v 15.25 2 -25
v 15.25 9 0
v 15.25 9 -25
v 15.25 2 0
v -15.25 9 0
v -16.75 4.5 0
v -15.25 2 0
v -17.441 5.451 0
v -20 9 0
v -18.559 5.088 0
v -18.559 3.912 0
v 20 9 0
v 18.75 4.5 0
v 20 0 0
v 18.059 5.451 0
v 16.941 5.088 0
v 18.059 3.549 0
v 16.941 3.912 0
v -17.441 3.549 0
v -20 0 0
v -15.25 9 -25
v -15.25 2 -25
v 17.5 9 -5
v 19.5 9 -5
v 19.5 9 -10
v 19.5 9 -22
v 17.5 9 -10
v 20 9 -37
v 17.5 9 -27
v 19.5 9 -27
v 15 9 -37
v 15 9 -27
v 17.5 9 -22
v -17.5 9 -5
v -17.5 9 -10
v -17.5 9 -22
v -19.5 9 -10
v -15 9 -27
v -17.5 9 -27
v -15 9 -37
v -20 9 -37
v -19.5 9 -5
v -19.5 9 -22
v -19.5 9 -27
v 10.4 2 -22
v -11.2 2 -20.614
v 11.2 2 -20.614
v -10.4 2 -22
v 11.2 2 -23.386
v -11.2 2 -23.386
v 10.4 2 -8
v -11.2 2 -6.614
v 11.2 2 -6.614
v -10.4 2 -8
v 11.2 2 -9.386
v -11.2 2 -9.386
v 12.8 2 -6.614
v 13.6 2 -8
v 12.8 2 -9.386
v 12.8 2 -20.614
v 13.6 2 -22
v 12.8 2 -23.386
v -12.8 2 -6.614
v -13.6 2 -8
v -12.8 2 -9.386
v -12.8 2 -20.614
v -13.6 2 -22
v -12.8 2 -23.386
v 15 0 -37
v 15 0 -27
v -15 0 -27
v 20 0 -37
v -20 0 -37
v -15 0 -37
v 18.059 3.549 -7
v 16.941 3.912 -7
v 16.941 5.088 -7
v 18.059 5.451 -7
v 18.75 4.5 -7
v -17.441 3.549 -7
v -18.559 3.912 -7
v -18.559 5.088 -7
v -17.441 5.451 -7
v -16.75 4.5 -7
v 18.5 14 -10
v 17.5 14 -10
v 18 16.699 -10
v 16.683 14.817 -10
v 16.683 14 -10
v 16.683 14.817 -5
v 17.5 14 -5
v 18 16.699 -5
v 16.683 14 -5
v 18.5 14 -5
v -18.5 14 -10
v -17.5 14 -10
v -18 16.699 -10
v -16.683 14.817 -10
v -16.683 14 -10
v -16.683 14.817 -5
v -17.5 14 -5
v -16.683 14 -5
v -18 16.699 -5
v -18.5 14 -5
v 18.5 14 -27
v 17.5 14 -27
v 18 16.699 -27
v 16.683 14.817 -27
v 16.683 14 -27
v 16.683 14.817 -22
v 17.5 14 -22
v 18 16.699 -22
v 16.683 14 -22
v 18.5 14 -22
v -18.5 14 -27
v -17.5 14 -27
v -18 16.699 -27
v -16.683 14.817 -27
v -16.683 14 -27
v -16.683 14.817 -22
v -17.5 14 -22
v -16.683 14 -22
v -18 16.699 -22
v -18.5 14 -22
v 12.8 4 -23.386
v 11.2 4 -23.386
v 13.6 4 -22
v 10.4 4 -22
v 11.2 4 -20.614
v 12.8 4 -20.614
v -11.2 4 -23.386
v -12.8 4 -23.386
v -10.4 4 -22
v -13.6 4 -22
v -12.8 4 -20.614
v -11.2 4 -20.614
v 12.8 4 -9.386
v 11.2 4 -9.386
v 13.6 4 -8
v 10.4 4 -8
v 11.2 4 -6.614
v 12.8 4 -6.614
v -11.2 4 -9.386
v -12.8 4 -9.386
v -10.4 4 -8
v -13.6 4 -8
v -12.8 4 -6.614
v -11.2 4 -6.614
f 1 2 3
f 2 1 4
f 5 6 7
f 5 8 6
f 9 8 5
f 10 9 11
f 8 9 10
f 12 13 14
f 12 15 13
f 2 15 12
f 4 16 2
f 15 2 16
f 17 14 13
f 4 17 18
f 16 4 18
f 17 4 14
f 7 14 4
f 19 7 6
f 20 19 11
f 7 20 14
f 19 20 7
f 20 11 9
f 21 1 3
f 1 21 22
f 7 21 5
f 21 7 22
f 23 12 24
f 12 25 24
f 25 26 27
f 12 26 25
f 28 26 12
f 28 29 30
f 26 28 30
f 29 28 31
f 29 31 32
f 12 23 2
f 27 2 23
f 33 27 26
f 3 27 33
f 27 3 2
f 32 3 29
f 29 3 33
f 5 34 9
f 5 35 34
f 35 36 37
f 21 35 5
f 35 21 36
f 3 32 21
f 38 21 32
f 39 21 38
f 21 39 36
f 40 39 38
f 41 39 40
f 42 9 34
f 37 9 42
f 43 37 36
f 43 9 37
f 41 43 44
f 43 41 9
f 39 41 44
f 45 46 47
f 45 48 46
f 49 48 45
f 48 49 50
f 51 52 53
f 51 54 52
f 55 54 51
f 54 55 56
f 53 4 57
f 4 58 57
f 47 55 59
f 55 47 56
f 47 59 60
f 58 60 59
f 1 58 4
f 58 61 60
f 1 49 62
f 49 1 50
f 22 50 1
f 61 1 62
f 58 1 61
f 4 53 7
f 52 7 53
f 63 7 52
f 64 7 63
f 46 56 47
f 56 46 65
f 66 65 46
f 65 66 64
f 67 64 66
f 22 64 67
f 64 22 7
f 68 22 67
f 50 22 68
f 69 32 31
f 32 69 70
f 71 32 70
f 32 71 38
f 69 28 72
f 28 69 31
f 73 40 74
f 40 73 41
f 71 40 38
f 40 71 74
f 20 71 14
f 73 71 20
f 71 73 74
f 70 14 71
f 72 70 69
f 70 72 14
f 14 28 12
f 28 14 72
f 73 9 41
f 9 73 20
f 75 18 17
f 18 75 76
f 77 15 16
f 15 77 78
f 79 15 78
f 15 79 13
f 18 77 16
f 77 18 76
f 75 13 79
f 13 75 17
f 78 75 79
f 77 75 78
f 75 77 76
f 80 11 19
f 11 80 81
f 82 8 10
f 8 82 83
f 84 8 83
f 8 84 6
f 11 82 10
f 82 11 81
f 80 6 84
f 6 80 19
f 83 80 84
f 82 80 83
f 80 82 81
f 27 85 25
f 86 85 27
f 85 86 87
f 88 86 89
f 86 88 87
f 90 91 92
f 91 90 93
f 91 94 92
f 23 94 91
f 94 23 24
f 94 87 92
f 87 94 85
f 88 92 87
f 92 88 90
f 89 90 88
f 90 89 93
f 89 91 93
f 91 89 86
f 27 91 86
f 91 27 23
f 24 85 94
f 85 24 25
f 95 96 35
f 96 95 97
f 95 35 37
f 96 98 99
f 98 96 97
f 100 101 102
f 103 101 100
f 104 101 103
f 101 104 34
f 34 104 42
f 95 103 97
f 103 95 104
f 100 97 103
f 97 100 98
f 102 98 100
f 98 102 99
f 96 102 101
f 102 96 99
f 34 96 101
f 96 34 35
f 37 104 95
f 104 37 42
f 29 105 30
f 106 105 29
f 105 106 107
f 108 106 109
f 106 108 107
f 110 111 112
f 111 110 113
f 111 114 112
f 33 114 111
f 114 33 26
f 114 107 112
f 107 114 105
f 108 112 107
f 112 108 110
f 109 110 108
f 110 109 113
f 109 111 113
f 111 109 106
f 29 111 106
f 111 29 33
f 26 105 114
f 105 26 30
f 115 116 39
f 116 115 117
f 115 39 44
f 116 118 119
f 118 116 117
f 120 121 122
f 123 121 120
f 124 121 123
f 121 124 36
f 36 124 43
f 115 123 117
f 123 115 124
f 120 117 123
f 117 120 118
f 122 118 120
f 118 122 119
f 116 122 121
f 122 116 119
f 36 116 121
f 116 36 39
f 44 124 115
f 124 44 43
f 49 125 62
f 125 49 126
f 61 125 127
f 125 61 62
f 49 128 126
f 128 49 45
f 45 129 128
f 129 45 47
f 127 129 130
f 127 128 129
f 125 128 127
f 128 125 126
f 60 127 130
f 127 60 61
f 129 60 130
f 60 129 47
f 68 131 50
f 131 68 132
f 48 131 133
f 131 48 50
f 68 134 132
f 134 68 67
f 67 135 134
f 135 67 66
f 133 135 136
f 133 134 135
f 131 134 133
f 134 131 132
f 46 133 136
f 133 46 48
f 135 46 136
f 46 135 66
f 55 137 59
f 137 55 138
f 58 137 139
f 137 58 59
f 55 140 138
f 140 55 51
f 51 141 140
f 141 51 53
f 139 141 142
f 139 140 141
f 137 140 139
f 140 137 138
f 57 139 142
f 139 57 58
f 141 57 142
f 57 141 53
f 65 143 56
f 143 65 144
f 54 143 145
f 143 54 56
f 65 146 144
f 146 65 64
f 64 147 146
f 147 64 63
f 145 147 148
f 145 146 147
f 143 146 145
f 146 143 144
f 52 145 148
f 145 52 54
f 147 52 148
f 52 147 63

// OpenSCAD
// file: HelpMethods/triangle.scad
module triangle(c, height, betha)
{ 
    c_right=height*cos(betha);
    c_left=-c+height*cos(betha);
    // draw triangle c=x, C=[0,heigth]
    polygon(points=[ [c_left,0], [c_right,0], [0,height] ]);
}

module isosides_triangle(a)
{
      height= sin(60)*a;
    // draw triangle c=x, C=[0,heigth]
      polygon(points=[ [-a/2,0], [a/2,0], [0,height] ]);
}

module isosceles_triangle(c,height)
{
    // draw triangle c=x, C=[0,heigth]
     polygon(points=[ [-c/2,0], [c/2,0], [0,height] ]);
}

module rightangular_triangle(width, height)
{
      // draw triangle c=x, C=[0,heigth]
     polygon(points=[ [0,0], [width,0], [0,height] ]);
}

rightangular_triangle(2,2);
// file: HelpMethods/SnapLib.0.36.scad
/*simple Snap library based on "Snap-Fit Joints for Plastics - A Design Guid" by Bayer MaterialScience LLC 
  http://fab.cba.mit.edu/classes/S62.12/people/vernelle.noel/Plastic_Snap_fit_design.pdf
 
 on http://www.thingiverse.com/thing:1860118
 
    by fpetrac Fausto Petraccone fpetrac@gmail.com 
    Licensed under the Creative Commons - Attribution - Non-Commercial license.
*/

/*Rev
    SnapLib 0.36.scad: added SnapHoleY function  
    SnapLib 0.35.scad: on RSnapY added a check to avioid interference of lobes during closure; on RRSnappY added a check to avioid overlapped lobes.
    SnapLib 0.30.scad  added function Hsnap and Snap to calculate the snap H or Y for cantilever snap
    SnapLib 0.25.scad  added Scale factor f to reduce the calculate value h or y (this mantain the snap on unbreakable zone when f>1)
    SnapLib 0.20.scad  Bug Fix
    SnapLib 0.10.scad  added RSnapY RRSnapY
    SnapLib 0.00.scad  first release
*/


/*
eps=0.5*6/100;//Elongation at break of PLA=6%
eps=0.5*12/100;//Elongation at break of ABS=12%
eps=0.5*18/100;//Elongation at break of PETG=18%
*/

eps=0.5*6/100;//Elongation at break of PLA=6%


function Hsnap(l,y,f)= (1.09/f)*(eps*pow(l,2))/(y);
function Ysnap(l,h,f)= (1.09/f)*(eps*pow(l,2))/(h);

//SnapH(l,y,a,b,f=1) Define y calculate h and divide the calculte h value to a factor f
module SnapH(l,y,a,b,f=1)   
{
    h=Hsnap(l,y,f);
    p=y;
    echo("h is",h);
linear_extrude(height = b, center = f, convexity = 10, twist = 0)
polygon([[0,0],[l,0],[l,y],[l+p,y],[l+p+(y+h/4)/tan(a),-h/4],[l,-h/2],[0,-h]]);
}
//SnapY(l,h,a,b,f=1) Define h calculate y and divide the calculte y value to a factor f
module SnapY(l,h,a,b,f=1)
{
    y=Ysnap(l,h,f);
    p=y;
    echo("y is", y);
linear_extrude(height = b, center = f, convexity = 10, twist = 0)
polygon([[0,0],[l,0],[l,y],[l+p,y],[l+p+(y+h/4)/tan(a),-h/4],[l,-h/2],[0,-h]]);
}
//SnapHoleY(l,h,a,b,f=1,Pr=2) Define h calculate y and divide the calculte y value to a factor f the total hole depth is h*PR
module SnapHoleY(l,h,a,b,f=1,Pr=2){
        //%SnapY(l,h,a,b);  
        y=Ysnap(l,h,f);
        YY=Pr*h;//depth Y;
        XX=1.1*(y+(y+h/4)/tan(a)); //Altezza totale +10%
        ZZ=0+b; //largezza piu tolleranza
        union(){
            translate([0,-YY,(b-ZZ)/2])cube([l,YY,ZZ],center=false); //gambo
            translate([l,-YY,(b-ZZ)/2])cube([XX,YY+y,ZZ],center=false);//testa
        }    
 }



//Define h calculate y and divide the calculated value to f
module RSnapY(l,h,a,Lobi,r2,f=1,K2=2)   
{
    Theta=180/Lobi;
    y=(1.64/f)*K2*(eps*pow(l,2))/(r2);
    p=y;
    echo("y is", y);
    echo("r1/r2",(r2-h)/r2);
    echo("Theta", Theta);
    echo("r2-h",(r2-h));
    if(((r2-h)>y)&&(h<r2)){ //(r2-h)>y should be (r2-h/2)>y and  h<r2 for scad problem
      for(f=[0:1:Lobi])
          rotate([0,0,Theta*2*f])
              rotate_extrude(angle = Theta, convexity = 2,$fn=200)
                  translate([r2,0,0])
                      mirror([1,-1,0])
                          polygon([[0,0],[l,0],[l,y],[l+p,y],[l+p+(y+h/4)/tan(a),-h/4],[l,-h/2],[0,-h]]);
    }
    else{
      echo ("<b>WARNING:</b>");
      echo("y should be < r2-h ");
      echo("h should be < r2 ");
    }
}
//Define h calculate y and divide the calculated value to f
module RRSnapY(l,h,a,Lobi,r2,f=1,K1=2)
{
    Theta=180/Lobi;
    y=(1.64/f)*K1*(eps*pow(l,2))/(r2);
    p=y;
    echo("y is", y);
    echo("r1/r2",(r2-h)/r2);
    echo("Theta", Theta);
    echo("r2-y",(r2-y));
    if(y<r2){
      for(f=[0:1:Lobi])
          rotate([0,180,Theta*2*f])
              rotate_extrude(angle = Theta, convexity = 2,$fn=200)
                  translate([r2,0,0])
                      mirror([1,1,0])
                          polygon([[0,0],[l,0],[l,y],[l+p,y],[l+p+(y+h/4)/tan(a),-h/4],[l,-h/2],[0,-h]]);
  }
      else{
      echo ("<b>WARNING:</b>");
      echo("y should be < r2 ");
      }
}
// file: HelpMethods/holder_triangle.scad
// holder triangle
use <triangle.scad>

module holder_triangle(space=[20,20],clearance=2, fillout=1)
    {
      translate([0,-space[0]/2,0])rotate([0,-90,0]) linear_extrude(height = space[1]*fillout, center = true) {rightangular_triangle(clearance,clearance);}
    }
    
 holder_triangle();
// main file
//printhead for connection with FFC cable 

// libaries
use <HelpMethods/holder_triangle.scad>
use <HelpMethods/SnapLib.0.36.scad>

//<<<<<<<<<<<<<<<Execution>>>>>>>>>>>>>>
printhead_bottom();
//printhead_top();
//plate_clamp();
//<<<<<<<<<<<<<<<<<>>>>>>>>>>>>>>>>>
// functions
// import
//------------------------------
// variables in mm, select NP_width
//nozzle plate big
NP_height = 1.3;
//NP_width = 6.9;
NP_offset_z = 9;

//nozzle plate small
NP_width = 6.8;
 
CPNP_distance = 9;

//plate holder
PH_length = 3;
PH_width = 1;
PH_distance = 15;
PH_offset = 2;  

fill_window_x = NP_width;
fill_window_y = 10;
fill_window_z = 12;

// contact plate
CP_width = 30.5;
CP_depth= 20.5;
CP_height = 2;

// printhead top
PT_outside_x = 34.3; // old =34.3
PT_outside_y = 5;
PT_outside_z = 36;

PT_inside_x = 20;
PT_inside_y = 1;
PT_inside_z = PT_outside_z - NP_offset_z;

//plate clamp hole
PC_snap_width_z = 2;
PC_snap_play = 1;
PC_snap_height_y = PT_outside_y - PT_inside_y + NP_height;
PC_snap_deep_x = 2;
PC_space =  NP_width + 3.8 ; //war vorher + 4
PC_snap_space = PC_space / PC_snap_play;
PC_offset_z = 11;

PC_hole_width_z = PC_snap_width_z + 1;
PC_hole_height_x = 3;
PC_hole_deep_y = PT_outside_y;

PC_hole_position_x = PC_space/2 + PC_hole_height_x;
PC_hole_position_y = CPNP_distance;
PC_hole_position_z = NP_offset_z + PC_offset_z + PC_hole_width_z;

// plate clamp 
PC_clamp_thick = 2;
PC_clamp_width = PC_snap_space + 2*PC_snap_deep_x;
PC_clamp_height= PC_snap_width_z;

PC_clamp_position_x = PC_clamp_width/2;
PC_clamp_position_y = CPNP_distance + PT_inside_y - PC_clamp_thick -NP_height;
PC_clamp_position_z = NP_offset_z + PC_offset_z + PC_clamp_height; 

// printhead bottom
PB_outside_x = 40;
PB_outside_y = 9;
PB_outside_z = 37;

PB_inside_x = CP_width;
PB_inside_y = PB_outside_y - CP_height;
PB_inside_z = 25;

// printspace
PS_x = 30;
PS_y = 10;
PS_z = 10;

// snap
snap_play = 0.98;
snap_distance = 17;
snap_offset_z = 10;

// stop and windstopper printhead top
SPT_x = 2;
SPT_y = 9;
SPT_z = 10;
SPT_offset_z = 25;

// stop contact plate
SCP_x = 5;
SCP_y = 2;
SCP_z = 2;

// Nozzleplate big
module NozzlePlate(){
     translate([0,9,-14.2]) import("nozzle platine/Nozzle Plate Hp big.stl");
}

// spring contacts
module contacts(){
     translate([0,1.5,-16]) import("contact platine/contact platine solo.stl");
}
//--------------------------------
module printhead_top(){
    difference(){
// outside
    translate([-PT_outside_x/2,CPNP_distance,-PT_outside_z])cube([PT_outside_x,PT_outside_y,PT_outside_z]);
	union(){
// inside
    translate([-PT_inside_x/2,CPNP_distance,-PT_outside_z])cube([PT_inside_x,PT_inside_y,PT_inside_z]);
// fillwindow
    translate([-fill_window_x/2,CPNP_distance,-PT_outside_z])cube([fill_window_x,fill_window_y,fill_window_z]);
// print clamp hole
    printhead_clamp_hole();
    mirror ([1,0,0]) printhead_clamp_hole();
        }
    }
    difference() {
    translate([0, 9, -31]) cube([20, 3, 10], center=true);
    translate([0, 8, -31]) cube([5.5, 5, 10], center=true);
    translate([-NP_width/2, 8.5, -36]) cube([NP_width, 2, 10]);
    }
    
// printhead clamp_hole
module printhead_clamp_hole(){
    translate ([-PC_hole_position_x, PC_hole_position_y, -PC_hole_position_z ]) cube([PC_hole_height_x, PC_hole_deep_y, PC_hole_width_z]);
}
//stopper
module stopper(){
    translate([-SPT_x - PT_inside_x/2,CPNP_distance - SPT_y,-SPT_offset_z - SPT_z]) cube([SPT_x, SPT_y,SPT_z]);
    }
    stopper();
    mirror ([1,0,0]) stopper();
//plate holder
    Plate();
}
// bottom
module printhead_bottom(){    
    difference() {  
    translate([-PB_outside_x/2,0,-PB_outside_z]) cube([PB_outside_x,PB_outside_y,PB_outside_z]);
    // plate space
    union(){
// Contact plate space
	translate([-PB_inside_x/2,CP_height, -PB_inside_z]) cube([PB_inside_x, PB_inside_y, PB_inside_z]);
// Print space
    translate([-PS_x/2,0,-PB_outside_z])cube ([PS_x,PS_y,PS_z]);
    }
//holes for mounting screws (to X_moving)
    translate([17.75, 4.5, -7]) cylinder(h=10, r=1); 
    translate([-17.75, 4.5, -7]) cylinder(h=10, r=1); 
    }
    snap();
    mirror([1,0,0])snap();
    translate([0,0,-snap_distance])snap();
    mirror([1,0,0]) translate([0,0,-snap_distance])snap();
//cylinders to fix the board  
    translate([12, 0, -22]) rotate([-90, 0, 0]) cylinder(r=1.6, h=4);
    translate([-12, 0, -22]) rotate([-90, 0, 0]) cylinder(r=1.6, h=4);
    translate([12, 0, -8]) rotate([-90, 0, 0]) cylinder(r=1.6, h=4);
    translate([-12, 0, -8]) rotate([-90, 0, 0]) cylinder(r=1.6, h=4);
    

    // contactplate stop
   /* translate([-CP_width/2,CP_height, -PB_inside_z + CP_depth-0.4]) cube([SCP_x,SCP_y,SCP_z]);
    mirror([1,0,0]) translate([-CP_width/2,CP_height, -PB_inside_z + CP_depth-0.4]) cube([SCP_x,SCP_y,SCP_z]); */
    
//snap
module snap(){
    translate([PT_outside_x/2/snap_play, PB_outside_y, -snap_offset_z]) rotate([0,0,90])SnapY(l=PT_outside_y,h=2,a=35,b=5,f=0.5);
}
}
//Plateholder
module Plate(){
    plate_holder();
    translate ([0,0,-PH_distance - PH_length]) plate_holder();
    // holder
    module plate_holder(){
        translate([-NP_width/2 - PH_width,CPNP_distance,-NP_offset_z - PH_length - PH_offset ]) cube([PH_width,PH_width,PH_length]);
        mirror([1,0,0]) translate([-NP_width/2 - PH_width,CPNP_distance,-NP_offset_z - PH_length - PH_offset ]) cube([PH_width,PH_width,PH_length]);
    }
}

//Plate clamp
module plate_clamp(){
     translate([-PC_clamp_position_x,PC_clamp_position_y,-PC_clamp_position_z])cube([PC_clamp_width, PC_clamp_thick,PC_clamp_height]);
     // snap
     clamp();
     mirror ([1,0,0]) clamp();
     module clamp(){
	  translate([PC_snap_space/2,PC_clamp_position_y+PC_clamp_thick,-PC_clamp_position_z]) rotate([0,0,90]) SnapY(l=PC_snap_height_y,h=PC_snap_deep_x,a=35,b=PC_snap_width_z,f=0.5);
	  }
}
